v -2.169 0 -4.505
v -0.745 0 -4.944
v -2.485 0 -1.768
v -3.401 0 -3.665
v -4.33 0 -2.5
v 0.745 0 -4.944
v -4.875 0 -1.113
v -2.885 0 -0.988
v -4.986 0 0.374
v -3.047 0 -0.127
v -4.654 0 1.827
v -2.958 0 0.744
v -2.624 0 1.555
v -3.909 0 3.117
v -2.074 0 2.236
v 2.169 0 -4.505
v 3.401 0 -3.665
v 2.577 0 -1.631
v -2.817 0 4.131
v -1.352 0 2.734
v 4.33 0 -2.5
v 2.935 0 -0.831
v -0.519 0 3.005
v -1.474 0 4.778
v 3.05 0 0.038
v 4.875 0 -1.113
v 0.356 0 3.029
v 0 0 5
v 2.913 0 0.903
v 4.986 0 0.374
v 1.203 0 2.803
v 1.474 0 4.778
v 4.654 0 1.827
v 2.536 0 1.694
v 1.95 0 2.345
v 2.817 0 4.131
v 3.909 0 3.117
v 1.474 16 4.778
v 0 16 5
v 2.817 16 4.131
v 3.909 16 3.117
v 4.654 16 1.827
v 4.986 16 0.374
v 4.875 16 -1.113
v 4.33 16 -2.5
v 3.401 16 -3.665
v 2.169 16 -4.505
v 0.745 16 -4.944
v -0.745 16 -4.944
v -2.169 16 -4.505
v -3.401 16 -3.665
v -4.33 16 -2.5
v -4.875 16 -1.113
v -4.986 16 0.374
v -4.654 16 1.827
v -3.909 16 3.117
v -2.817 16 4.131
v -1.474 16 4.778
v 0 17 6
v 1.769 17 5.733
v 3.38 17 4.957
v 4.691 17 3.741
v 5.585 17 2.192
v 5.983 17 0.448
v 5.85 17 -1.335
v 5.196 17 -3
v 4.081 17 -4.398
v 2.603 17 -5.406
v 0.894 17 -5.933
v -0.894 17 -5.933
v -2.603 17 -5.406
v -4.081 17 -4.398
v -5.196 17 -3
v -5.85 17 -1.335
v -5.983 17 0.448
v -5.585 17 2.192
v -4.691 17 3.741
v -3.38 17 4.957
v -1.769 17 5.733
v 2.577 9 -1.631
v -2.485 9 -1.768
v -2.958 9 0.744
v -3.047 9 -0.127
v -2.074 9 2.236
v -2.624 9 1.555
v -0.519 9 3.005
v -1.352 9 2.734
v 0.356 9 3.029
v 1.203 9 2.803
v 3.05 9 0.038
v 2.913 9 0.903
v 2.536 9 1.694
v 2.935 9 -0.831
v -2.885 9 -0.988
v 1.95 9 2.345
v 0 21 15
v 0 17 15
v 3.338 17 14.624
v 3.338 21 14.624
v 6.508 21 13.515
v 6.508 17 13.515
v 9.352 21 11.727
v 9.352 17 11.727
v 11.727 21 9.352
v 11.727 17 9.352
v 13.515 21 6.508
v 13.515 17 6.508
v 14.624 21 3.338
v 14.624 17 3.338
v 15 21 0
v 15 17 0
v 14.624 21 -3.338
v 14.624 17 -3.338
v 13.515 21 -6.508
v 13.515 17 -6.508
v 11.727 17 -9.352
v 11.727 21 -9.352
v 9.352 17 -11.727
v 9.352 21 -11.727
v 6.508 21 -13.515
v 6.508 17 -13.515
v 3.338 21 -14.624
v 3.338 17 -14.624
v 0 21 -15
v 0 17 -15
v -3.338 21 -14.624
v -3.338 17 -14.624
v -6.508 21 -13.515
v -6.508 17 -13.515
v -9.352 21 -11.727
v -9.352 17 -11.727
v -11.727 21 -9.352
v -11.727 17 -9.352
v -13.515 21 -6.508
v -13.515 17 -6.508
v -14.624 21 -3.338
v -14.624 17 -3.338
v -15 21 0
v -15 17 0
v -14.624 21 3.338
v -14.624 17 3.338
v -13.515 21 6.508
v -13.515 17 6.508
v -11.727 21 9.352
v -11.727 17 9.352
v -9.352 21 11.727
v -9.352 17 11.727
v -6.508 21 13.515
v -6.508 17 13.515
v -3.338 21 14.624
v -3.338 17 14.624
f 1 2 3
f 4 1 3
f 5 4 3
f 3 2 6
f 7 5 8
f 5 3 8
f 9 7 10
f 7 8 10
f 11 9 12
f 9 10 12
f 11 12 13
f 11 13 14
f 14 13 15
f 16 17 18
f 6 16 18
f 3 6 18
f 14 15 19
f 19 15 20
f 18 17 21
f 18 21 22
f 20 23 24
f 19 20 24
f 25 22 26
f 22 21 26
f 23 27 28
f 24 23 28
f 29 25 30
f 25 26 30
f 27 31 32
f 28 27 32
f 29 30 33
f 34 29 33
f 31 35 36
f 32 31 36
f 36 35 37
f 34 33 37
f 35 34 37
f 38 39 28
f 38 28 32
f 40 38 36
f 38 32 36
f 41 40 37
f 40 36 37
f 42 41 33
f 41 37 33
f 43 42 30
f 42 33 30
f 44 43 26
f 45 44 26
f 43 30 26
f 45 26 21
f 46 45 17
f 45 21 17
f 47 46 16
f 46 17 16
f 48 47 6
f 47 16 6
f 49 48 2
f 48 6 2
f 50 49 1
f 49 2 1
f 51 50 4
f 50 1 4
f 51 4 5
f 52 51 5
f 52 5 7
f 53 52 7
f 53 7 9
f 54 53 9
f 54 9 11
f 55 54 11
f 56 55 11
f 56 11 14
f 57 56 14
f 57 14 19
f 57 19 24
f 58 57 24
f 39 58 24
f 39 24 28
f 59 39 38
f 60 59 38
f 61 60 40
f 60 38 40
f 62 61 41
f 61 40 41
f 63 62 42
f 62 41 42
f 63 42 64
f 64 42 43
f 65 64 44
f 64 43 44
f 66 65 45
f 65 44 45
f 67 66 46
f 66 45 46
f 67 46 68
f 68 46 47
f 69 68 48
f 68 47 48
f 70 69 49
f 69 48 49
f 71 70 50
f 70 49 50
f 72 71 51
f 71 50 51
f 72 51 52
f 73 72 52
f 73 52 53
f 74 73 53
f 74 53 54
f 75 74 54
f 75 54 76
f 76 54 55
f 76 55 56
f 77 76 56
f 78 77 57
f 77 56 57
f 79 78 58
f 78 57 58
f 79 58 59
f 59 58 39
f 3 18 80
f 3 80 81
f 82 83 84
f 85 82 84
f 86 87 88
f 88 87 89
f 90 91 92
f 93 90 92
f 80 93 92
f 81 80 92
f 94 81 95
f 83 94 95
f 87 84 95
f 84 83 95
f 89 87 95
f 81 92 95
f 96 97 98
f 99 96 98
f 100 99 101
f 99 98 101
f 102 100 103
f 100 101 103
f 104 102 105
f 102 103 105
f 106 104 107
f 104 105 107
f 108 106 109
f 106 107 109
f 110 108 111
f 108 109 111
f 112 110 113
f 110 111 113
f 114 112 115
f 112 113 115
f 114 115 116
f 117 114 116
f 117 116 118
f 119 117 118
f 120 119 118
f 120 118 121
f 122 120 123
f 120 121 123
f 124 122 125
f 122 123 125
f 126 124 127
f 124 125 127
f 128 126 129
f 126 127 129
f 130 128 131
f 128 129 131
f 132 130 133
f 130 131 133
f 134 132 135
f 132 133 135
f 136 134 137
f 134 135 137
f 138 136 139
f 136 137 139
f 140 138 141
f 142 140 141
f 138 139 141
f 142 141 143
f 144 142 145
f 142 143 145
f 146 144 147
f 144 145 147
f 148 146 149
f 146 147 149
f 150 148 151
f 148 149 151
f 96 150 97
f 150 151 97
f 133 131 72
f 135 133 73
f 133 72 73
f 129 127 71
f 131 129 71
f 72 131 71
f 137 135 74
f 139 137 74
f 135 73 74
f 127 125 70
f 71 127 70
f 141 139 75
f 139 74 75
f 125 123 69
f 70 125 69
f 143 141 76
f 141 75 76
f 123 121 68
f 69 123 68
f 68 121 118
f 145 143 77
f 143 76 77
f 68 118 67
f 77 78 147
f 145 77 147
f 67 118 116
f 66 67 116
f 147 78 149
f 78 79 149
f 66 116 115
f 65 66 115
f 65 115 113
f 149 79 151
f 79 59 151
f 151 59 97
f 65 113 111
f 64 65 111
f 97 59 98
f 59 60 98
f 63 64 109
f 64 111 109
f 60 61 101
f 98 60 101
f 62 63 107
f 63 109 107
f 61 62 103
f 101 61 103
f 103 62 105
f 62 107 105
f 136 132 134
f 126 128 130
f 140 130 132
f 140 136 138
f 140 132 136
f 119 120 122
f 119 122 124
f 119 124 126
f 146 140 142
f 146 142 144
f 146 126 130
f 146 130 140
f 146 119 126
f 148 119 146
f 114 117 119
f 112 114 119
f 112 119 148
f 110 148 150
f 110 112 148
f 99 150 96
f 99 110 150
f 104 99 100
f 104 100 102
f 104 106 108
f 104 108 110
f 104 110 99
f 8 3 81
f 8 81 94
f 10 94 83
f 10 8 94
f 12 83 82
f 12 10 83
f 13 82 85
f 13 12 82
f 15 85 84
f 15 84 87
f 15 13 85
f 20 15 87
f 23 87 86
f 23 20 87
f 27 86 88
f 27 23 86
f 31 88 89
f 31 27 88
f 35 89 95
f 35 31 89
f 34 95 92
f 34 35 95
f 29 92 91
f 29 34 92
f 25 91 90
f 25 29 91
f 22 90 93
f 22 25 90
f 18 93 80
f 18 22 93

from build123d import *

# Parameters (mm, degrees)
SKETCH_1_R      = 5
EXTRUDE_1_DEPTH = 9
SKETCH_5_R      = 5
EXTRUDE_5_DEPTH = 8
SKETCH_6_R      = 15
EXTRUDE_6_DEPTH = 4
CHAMFER_3_SIZE  = 1


with BuildPart() as part:
    # 草图1 → 凸台-拉伸1 (new body)
    with BuildSketch(Plane(origin=(0, 0, 0), x_dir=(1, 0, 0), z_dir=(0, 1, 0))):
        with Locations(Location((0, 0, 0), (0, 0, 270))):
            Circle(SKETCH_1_R)
        with BuildLine():
            Line((2.577287197, 1.63097845), (-2.485447743, 1.767780959))
            ThreePointArc((-2.485447743, 1.767780959), (-0.082385393, -3.048887116), (2.577287197, 1.63097845))
        make_face(mode=Mode.SUBTRACT)
    extrude(amount=EXTRUDE_1_DEPTH)

    # 草图5 → 凸台-拉伸5 (add)
    with BuildSketch(Plane(origin=(0, 9, 0), x_dir=(1, 0, 0), z_dir=(0, 1, 0))):
        with Locations(Location((0, 0, 0), (0, 0, 270))):
            Circle(SKETCH_5_R)
    extrude(amount=EXTRUDE_5_DEPTH)

    # 草图6 → 凸台-拉伸6 (add)
    with BuildSketch(Plane(origin=(0, 17, 0), x_dir=(1, 0, 0), z_dir=(0, 1, 0))):
        with Locations(Location((0, 0, 0), (0, 0, 270))):
            Circle(SKETCH_6_R)
    extrude(amount=EXTRUDE_6_DEPTH)

    # 倒角3
    chamfer_3_edges = [part.edges().sort_by_distance(p)[0] for p in [
        (0, 17, -5),
    ]]
    chamfer(chamfer_3_edges, length=CHAMFER_3_SIZE)


solid = part.part
